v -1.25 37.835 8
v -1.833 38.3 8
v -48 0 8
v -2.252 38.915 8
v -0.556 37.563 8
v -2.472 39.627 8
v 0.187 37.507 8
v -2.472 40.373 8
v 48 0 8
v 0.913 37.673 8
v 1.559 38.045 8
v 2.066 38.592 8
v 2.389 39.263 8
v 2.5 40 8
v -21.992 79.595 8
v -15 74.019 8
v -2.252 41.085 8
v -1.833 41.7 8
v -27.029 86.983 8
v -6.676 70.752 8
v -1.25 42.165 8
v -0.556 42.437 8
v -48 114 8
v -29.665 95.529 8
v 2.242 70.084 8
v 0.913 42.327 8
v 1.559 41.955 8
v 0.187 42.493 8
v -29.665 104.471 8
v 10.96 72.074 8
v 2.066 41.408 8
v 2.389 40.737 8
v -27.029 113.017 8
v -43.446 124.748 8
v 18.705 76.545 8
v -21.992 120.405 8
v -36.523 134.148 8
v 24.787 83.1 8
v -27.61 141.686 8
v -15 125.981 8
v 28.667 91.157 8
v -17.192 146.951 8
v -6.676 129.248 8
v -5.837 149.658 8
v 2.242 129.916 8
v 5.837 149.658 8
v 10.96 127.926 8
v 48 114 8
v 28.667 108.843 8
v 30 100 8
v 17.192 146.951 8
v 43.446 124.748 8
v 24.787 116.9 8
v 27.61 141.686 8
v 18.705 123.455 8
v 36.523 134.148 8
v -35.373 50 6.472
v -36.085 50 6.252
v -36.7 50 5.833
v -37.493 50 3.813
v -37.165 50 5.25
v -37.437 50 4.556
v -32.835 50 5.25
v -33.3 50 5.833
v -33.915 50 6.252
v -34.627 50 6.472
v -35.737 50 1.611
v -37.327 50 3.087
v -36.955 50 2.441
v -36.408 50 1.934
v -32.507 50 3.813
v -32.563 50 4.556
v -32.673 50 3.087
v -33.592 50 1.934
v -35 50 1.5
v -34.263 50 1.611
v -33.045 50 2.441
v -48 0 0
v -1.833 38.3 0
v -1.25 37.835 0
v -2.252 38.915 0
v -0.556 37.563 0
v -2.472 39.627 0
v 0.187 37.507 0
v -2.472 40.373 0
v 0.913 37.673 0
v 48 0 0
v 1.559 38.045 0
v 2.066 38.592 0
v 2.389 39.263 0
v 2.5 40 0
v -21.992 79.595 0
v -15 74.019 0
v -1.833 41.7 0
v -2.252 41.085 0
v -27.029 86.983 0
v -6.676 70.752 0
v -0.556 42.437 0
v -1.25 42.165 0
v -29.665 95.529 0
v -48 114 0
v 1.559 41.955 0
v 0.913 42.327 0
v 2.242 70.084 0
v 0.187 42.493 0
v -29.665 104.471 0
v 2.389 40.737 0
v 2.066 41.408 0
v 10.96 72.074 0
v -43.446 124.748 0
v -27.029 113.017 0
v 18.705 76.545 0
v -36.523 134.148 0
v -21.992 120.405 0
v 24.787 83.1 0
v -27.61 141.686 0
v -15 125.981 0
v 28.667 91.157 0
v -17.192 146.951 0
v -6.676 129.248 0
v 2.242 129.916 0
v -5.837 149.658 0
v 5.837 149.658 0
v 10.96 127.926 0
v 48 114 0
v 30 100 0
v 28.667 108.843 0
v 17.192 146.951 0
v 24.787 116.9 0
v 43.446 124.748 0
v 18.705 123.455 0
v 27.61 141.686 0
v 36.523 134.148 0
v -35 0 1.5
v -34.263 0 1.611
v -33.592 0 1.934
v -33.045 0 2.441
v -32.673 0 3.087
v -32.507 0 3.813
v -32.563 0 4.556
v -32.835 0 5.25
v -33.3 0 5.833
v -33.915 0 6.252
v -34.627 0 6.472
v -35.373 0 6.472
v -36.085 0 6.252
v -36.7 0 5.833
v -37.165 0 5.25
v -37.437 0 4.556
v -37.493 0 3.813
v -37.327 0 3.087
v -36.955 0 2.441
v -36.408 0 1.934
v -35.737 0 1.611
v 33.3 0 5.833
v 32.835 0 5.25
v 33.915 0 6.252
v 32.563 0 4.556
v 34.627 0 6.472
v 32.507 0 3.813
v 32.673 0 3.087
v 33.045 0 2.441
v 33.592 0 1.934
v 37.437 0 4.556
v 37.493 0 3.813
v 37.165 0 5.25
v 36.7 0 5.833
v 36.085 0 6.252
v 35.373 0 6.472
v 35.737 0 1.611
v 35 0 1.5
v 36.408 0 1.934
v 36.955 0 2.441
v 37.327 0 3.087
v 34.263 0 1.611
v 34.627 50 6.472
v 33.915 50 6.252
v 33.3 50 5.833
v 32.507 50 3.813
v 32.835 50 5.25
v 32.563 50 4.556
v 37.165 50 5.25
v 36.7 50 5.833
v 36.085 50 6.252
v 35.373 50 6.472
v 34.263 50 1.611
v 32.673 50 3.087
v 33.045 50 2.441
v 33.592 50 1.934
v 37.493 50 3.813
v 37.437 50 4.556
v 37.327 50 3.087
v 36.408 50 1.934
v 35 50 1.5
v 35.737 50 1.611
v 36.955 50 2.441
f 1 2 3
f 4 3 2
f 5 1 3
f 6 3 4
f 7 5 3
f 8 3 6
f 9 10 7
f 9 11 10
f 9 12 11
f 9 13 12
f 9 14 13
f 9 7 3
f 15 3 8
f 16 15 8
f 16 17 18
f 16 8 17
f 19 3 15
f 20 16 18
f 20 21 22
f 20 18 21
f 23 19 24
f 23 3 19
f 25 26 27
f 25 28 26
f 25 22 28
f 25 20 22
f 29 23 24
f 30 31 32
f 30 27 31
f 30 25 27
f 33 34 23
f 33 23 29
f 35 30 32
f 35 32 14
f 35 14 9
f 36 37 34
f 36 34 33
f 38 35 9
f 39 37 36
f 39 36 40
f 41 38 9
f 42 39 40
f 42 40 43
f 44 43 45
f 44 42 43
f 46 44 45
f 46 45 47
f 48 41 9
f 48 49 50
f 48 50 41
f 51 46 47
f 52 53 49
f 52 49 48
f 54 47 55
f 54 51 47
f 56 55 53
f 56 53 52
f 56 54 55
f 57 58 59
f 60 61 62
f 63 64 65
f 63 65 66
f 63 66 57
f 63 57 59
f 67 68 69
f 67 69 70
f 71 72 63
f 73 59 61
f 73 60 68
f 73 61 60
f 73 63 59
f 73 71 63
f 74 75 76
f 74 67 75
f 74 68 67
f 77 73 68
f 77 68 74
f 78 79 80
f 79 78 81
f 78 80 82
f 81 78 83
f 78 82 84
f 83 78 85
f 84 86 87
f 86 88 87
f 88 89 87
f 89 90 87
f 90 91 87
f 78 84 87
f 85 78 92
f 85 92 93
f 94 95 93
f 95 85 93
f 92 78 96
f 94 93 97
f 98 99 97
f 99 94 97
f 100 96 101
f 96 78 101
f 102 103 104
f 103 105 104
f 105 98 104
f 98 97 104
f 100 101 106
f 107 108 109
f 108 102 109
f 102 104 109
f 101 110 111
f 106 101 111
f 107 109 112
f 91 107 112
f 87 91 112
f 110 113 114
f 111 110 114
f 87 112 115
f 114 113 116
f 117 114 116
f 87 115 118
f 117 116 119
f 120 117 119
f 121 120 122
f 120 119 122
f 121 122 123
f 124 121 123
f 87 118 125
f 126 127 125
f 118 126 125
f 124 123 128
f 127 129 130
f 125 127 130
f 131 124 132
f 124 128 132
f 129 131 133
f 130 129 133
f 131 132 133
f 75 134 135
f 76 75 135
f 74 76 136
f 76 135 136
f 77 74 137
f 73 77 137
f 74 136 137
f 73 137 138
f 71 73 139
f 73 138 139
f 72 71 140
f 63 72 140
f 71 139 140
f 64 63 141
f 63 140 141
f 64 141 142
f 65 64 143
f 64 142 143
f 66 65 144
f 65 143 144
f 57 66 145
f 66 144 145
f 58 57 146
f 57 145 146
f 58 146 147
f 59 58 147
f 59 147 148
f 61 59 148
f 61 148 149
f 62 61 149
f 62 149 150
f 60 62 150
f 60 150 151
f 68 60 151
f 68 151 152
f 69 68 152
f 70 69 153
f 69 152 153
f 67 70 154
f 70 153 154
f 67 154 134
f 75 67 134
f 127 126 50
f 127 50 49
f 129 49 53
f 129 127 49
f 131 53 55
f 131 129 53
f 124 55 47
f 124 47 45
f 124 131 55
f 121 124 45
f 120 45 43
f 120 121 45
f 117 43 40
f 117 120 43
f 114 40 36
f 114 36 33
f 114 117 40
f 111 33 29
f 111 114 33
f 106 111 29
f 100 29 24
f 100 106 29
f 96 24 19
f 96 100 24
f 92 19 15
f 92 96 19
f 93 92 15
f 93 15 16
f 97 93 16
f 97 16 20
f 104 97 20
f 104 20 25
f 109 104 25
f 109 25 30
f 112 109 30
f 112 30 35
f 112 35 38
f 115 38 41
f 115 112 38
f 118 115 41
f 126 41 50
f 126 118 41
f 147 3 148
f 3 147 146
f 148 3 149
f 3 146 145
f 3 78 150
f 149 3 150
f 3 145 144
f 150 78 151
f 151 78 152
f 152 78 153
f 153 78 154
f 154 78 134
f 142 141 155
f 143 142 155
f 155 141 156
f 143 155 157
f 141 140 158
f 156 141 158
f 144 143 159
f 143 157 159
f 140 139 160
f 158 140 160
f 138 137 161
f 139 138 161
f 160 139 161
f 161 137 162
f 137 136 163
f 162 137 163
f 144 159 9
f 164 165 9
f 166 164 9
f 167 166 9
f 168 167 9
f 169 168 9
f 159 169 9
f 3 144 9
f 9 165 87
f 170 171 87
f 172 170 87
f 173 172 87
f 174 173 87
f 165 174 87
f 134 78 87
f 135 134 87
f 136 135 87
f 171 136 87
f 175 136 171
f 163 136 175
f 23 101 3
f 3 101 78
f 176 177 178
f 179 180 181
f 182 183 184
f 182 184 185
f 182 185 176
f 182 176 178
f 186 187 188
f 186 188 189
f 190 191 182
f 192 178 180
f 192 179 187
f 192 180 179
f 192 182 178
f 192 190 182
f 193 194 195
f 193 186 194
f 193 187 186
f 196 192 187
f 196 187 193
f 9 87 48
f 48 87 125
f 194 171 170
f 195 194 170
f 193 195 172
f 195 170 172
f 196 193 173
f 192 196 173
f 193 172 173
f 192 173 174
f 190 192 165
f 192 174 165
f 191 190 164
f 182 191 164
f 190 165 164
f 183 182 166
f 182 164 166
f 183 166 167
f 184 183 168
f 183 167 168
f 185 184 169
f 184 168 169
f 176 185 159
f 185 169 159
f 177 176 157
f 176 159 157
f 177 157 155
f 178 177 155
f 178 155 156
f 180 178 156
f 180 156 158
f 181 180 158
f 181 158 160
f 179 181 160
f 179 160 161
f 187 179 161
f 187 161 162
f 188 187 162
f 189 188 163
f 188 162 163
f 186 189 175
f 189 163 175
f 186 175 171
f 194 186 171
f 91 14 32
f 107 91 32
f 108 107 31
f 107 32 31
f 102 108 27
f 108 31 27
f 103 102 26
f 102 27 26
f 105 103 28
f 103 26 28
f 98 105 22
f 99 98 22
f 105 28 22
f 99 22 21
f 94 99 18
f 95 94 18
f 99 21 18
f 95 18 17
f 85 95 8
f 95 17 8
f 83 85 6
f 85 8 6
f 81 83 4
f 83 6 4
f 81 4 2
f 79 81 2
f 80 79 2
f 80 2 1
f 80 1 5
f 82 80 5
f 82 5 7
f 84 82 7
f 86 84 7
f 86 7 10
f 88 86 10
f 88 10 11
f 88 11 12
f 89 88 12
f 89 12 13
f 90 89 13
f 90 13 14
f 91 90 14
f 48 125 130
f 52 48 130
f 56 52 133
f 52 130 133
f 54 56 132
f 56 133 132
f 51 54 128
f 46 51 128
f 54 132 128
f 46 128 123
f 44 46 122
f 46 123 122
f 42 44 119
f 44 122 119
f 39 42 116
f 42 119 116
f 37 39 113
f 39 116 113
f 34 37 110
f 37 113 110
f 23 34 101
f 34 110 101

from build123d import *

# Parameters (mm, degrees)
SKETCH_1_R          = 30
EXTRUDE_1_DEPTH     = 8
SKETCH_2_R          = 2.5
CUT_EXTRUDE_1_DEPTH = 50
SKETCH_3_R          = 2.5
CUT_EXTRUDE_2_DEPTH = 20


with BuildPart() as part:
    # 草图1 → 凸台-拉伸1 (new body)
    with BuildSketch(Plane.XY):
        with BuildLine():
            Line((-48, 114), (-48, 0))
            Line((-48, 0), (48, 0))
            Line((48, 0), (48, 114))
            ThreePointArc((48, 114), (0, 150), (-48, 114))
        make_face()
        with Locations((0, 100)):
            Circle(SKETCH_1_R, mode=Mode.SUBTRACT)
    extrude(amount=EXTRUDE_1_DEPTH)

    # 草图2 → 切除-拉伸1 (cut)
    with BuildSketch(Plane.XZ):
        with Locations(Location((35, 4, 0), (0, 0, 270))):
            Circle(SKETCH_2_R)
        with Locations(Location((-35, 4, 0), (0, 0, 270))):
            Circle(SKETCH_2_R)
    extrude(amount=-CUT_EXTRUDE_1_DEPTH, mode=Mode.SUBTRACT)

    # 草图3 → 切除-拉伸2 (cut)
    with BuildSketch(Plane.XY.offset(8)):
        with Locations((0, 40)):
            Circle(SKETCH_3_R)
    extrude(amount=-CUT_EXTRUDE_2_DEPTH, mode=Mode.SUBTRACT)


solid = part.part
